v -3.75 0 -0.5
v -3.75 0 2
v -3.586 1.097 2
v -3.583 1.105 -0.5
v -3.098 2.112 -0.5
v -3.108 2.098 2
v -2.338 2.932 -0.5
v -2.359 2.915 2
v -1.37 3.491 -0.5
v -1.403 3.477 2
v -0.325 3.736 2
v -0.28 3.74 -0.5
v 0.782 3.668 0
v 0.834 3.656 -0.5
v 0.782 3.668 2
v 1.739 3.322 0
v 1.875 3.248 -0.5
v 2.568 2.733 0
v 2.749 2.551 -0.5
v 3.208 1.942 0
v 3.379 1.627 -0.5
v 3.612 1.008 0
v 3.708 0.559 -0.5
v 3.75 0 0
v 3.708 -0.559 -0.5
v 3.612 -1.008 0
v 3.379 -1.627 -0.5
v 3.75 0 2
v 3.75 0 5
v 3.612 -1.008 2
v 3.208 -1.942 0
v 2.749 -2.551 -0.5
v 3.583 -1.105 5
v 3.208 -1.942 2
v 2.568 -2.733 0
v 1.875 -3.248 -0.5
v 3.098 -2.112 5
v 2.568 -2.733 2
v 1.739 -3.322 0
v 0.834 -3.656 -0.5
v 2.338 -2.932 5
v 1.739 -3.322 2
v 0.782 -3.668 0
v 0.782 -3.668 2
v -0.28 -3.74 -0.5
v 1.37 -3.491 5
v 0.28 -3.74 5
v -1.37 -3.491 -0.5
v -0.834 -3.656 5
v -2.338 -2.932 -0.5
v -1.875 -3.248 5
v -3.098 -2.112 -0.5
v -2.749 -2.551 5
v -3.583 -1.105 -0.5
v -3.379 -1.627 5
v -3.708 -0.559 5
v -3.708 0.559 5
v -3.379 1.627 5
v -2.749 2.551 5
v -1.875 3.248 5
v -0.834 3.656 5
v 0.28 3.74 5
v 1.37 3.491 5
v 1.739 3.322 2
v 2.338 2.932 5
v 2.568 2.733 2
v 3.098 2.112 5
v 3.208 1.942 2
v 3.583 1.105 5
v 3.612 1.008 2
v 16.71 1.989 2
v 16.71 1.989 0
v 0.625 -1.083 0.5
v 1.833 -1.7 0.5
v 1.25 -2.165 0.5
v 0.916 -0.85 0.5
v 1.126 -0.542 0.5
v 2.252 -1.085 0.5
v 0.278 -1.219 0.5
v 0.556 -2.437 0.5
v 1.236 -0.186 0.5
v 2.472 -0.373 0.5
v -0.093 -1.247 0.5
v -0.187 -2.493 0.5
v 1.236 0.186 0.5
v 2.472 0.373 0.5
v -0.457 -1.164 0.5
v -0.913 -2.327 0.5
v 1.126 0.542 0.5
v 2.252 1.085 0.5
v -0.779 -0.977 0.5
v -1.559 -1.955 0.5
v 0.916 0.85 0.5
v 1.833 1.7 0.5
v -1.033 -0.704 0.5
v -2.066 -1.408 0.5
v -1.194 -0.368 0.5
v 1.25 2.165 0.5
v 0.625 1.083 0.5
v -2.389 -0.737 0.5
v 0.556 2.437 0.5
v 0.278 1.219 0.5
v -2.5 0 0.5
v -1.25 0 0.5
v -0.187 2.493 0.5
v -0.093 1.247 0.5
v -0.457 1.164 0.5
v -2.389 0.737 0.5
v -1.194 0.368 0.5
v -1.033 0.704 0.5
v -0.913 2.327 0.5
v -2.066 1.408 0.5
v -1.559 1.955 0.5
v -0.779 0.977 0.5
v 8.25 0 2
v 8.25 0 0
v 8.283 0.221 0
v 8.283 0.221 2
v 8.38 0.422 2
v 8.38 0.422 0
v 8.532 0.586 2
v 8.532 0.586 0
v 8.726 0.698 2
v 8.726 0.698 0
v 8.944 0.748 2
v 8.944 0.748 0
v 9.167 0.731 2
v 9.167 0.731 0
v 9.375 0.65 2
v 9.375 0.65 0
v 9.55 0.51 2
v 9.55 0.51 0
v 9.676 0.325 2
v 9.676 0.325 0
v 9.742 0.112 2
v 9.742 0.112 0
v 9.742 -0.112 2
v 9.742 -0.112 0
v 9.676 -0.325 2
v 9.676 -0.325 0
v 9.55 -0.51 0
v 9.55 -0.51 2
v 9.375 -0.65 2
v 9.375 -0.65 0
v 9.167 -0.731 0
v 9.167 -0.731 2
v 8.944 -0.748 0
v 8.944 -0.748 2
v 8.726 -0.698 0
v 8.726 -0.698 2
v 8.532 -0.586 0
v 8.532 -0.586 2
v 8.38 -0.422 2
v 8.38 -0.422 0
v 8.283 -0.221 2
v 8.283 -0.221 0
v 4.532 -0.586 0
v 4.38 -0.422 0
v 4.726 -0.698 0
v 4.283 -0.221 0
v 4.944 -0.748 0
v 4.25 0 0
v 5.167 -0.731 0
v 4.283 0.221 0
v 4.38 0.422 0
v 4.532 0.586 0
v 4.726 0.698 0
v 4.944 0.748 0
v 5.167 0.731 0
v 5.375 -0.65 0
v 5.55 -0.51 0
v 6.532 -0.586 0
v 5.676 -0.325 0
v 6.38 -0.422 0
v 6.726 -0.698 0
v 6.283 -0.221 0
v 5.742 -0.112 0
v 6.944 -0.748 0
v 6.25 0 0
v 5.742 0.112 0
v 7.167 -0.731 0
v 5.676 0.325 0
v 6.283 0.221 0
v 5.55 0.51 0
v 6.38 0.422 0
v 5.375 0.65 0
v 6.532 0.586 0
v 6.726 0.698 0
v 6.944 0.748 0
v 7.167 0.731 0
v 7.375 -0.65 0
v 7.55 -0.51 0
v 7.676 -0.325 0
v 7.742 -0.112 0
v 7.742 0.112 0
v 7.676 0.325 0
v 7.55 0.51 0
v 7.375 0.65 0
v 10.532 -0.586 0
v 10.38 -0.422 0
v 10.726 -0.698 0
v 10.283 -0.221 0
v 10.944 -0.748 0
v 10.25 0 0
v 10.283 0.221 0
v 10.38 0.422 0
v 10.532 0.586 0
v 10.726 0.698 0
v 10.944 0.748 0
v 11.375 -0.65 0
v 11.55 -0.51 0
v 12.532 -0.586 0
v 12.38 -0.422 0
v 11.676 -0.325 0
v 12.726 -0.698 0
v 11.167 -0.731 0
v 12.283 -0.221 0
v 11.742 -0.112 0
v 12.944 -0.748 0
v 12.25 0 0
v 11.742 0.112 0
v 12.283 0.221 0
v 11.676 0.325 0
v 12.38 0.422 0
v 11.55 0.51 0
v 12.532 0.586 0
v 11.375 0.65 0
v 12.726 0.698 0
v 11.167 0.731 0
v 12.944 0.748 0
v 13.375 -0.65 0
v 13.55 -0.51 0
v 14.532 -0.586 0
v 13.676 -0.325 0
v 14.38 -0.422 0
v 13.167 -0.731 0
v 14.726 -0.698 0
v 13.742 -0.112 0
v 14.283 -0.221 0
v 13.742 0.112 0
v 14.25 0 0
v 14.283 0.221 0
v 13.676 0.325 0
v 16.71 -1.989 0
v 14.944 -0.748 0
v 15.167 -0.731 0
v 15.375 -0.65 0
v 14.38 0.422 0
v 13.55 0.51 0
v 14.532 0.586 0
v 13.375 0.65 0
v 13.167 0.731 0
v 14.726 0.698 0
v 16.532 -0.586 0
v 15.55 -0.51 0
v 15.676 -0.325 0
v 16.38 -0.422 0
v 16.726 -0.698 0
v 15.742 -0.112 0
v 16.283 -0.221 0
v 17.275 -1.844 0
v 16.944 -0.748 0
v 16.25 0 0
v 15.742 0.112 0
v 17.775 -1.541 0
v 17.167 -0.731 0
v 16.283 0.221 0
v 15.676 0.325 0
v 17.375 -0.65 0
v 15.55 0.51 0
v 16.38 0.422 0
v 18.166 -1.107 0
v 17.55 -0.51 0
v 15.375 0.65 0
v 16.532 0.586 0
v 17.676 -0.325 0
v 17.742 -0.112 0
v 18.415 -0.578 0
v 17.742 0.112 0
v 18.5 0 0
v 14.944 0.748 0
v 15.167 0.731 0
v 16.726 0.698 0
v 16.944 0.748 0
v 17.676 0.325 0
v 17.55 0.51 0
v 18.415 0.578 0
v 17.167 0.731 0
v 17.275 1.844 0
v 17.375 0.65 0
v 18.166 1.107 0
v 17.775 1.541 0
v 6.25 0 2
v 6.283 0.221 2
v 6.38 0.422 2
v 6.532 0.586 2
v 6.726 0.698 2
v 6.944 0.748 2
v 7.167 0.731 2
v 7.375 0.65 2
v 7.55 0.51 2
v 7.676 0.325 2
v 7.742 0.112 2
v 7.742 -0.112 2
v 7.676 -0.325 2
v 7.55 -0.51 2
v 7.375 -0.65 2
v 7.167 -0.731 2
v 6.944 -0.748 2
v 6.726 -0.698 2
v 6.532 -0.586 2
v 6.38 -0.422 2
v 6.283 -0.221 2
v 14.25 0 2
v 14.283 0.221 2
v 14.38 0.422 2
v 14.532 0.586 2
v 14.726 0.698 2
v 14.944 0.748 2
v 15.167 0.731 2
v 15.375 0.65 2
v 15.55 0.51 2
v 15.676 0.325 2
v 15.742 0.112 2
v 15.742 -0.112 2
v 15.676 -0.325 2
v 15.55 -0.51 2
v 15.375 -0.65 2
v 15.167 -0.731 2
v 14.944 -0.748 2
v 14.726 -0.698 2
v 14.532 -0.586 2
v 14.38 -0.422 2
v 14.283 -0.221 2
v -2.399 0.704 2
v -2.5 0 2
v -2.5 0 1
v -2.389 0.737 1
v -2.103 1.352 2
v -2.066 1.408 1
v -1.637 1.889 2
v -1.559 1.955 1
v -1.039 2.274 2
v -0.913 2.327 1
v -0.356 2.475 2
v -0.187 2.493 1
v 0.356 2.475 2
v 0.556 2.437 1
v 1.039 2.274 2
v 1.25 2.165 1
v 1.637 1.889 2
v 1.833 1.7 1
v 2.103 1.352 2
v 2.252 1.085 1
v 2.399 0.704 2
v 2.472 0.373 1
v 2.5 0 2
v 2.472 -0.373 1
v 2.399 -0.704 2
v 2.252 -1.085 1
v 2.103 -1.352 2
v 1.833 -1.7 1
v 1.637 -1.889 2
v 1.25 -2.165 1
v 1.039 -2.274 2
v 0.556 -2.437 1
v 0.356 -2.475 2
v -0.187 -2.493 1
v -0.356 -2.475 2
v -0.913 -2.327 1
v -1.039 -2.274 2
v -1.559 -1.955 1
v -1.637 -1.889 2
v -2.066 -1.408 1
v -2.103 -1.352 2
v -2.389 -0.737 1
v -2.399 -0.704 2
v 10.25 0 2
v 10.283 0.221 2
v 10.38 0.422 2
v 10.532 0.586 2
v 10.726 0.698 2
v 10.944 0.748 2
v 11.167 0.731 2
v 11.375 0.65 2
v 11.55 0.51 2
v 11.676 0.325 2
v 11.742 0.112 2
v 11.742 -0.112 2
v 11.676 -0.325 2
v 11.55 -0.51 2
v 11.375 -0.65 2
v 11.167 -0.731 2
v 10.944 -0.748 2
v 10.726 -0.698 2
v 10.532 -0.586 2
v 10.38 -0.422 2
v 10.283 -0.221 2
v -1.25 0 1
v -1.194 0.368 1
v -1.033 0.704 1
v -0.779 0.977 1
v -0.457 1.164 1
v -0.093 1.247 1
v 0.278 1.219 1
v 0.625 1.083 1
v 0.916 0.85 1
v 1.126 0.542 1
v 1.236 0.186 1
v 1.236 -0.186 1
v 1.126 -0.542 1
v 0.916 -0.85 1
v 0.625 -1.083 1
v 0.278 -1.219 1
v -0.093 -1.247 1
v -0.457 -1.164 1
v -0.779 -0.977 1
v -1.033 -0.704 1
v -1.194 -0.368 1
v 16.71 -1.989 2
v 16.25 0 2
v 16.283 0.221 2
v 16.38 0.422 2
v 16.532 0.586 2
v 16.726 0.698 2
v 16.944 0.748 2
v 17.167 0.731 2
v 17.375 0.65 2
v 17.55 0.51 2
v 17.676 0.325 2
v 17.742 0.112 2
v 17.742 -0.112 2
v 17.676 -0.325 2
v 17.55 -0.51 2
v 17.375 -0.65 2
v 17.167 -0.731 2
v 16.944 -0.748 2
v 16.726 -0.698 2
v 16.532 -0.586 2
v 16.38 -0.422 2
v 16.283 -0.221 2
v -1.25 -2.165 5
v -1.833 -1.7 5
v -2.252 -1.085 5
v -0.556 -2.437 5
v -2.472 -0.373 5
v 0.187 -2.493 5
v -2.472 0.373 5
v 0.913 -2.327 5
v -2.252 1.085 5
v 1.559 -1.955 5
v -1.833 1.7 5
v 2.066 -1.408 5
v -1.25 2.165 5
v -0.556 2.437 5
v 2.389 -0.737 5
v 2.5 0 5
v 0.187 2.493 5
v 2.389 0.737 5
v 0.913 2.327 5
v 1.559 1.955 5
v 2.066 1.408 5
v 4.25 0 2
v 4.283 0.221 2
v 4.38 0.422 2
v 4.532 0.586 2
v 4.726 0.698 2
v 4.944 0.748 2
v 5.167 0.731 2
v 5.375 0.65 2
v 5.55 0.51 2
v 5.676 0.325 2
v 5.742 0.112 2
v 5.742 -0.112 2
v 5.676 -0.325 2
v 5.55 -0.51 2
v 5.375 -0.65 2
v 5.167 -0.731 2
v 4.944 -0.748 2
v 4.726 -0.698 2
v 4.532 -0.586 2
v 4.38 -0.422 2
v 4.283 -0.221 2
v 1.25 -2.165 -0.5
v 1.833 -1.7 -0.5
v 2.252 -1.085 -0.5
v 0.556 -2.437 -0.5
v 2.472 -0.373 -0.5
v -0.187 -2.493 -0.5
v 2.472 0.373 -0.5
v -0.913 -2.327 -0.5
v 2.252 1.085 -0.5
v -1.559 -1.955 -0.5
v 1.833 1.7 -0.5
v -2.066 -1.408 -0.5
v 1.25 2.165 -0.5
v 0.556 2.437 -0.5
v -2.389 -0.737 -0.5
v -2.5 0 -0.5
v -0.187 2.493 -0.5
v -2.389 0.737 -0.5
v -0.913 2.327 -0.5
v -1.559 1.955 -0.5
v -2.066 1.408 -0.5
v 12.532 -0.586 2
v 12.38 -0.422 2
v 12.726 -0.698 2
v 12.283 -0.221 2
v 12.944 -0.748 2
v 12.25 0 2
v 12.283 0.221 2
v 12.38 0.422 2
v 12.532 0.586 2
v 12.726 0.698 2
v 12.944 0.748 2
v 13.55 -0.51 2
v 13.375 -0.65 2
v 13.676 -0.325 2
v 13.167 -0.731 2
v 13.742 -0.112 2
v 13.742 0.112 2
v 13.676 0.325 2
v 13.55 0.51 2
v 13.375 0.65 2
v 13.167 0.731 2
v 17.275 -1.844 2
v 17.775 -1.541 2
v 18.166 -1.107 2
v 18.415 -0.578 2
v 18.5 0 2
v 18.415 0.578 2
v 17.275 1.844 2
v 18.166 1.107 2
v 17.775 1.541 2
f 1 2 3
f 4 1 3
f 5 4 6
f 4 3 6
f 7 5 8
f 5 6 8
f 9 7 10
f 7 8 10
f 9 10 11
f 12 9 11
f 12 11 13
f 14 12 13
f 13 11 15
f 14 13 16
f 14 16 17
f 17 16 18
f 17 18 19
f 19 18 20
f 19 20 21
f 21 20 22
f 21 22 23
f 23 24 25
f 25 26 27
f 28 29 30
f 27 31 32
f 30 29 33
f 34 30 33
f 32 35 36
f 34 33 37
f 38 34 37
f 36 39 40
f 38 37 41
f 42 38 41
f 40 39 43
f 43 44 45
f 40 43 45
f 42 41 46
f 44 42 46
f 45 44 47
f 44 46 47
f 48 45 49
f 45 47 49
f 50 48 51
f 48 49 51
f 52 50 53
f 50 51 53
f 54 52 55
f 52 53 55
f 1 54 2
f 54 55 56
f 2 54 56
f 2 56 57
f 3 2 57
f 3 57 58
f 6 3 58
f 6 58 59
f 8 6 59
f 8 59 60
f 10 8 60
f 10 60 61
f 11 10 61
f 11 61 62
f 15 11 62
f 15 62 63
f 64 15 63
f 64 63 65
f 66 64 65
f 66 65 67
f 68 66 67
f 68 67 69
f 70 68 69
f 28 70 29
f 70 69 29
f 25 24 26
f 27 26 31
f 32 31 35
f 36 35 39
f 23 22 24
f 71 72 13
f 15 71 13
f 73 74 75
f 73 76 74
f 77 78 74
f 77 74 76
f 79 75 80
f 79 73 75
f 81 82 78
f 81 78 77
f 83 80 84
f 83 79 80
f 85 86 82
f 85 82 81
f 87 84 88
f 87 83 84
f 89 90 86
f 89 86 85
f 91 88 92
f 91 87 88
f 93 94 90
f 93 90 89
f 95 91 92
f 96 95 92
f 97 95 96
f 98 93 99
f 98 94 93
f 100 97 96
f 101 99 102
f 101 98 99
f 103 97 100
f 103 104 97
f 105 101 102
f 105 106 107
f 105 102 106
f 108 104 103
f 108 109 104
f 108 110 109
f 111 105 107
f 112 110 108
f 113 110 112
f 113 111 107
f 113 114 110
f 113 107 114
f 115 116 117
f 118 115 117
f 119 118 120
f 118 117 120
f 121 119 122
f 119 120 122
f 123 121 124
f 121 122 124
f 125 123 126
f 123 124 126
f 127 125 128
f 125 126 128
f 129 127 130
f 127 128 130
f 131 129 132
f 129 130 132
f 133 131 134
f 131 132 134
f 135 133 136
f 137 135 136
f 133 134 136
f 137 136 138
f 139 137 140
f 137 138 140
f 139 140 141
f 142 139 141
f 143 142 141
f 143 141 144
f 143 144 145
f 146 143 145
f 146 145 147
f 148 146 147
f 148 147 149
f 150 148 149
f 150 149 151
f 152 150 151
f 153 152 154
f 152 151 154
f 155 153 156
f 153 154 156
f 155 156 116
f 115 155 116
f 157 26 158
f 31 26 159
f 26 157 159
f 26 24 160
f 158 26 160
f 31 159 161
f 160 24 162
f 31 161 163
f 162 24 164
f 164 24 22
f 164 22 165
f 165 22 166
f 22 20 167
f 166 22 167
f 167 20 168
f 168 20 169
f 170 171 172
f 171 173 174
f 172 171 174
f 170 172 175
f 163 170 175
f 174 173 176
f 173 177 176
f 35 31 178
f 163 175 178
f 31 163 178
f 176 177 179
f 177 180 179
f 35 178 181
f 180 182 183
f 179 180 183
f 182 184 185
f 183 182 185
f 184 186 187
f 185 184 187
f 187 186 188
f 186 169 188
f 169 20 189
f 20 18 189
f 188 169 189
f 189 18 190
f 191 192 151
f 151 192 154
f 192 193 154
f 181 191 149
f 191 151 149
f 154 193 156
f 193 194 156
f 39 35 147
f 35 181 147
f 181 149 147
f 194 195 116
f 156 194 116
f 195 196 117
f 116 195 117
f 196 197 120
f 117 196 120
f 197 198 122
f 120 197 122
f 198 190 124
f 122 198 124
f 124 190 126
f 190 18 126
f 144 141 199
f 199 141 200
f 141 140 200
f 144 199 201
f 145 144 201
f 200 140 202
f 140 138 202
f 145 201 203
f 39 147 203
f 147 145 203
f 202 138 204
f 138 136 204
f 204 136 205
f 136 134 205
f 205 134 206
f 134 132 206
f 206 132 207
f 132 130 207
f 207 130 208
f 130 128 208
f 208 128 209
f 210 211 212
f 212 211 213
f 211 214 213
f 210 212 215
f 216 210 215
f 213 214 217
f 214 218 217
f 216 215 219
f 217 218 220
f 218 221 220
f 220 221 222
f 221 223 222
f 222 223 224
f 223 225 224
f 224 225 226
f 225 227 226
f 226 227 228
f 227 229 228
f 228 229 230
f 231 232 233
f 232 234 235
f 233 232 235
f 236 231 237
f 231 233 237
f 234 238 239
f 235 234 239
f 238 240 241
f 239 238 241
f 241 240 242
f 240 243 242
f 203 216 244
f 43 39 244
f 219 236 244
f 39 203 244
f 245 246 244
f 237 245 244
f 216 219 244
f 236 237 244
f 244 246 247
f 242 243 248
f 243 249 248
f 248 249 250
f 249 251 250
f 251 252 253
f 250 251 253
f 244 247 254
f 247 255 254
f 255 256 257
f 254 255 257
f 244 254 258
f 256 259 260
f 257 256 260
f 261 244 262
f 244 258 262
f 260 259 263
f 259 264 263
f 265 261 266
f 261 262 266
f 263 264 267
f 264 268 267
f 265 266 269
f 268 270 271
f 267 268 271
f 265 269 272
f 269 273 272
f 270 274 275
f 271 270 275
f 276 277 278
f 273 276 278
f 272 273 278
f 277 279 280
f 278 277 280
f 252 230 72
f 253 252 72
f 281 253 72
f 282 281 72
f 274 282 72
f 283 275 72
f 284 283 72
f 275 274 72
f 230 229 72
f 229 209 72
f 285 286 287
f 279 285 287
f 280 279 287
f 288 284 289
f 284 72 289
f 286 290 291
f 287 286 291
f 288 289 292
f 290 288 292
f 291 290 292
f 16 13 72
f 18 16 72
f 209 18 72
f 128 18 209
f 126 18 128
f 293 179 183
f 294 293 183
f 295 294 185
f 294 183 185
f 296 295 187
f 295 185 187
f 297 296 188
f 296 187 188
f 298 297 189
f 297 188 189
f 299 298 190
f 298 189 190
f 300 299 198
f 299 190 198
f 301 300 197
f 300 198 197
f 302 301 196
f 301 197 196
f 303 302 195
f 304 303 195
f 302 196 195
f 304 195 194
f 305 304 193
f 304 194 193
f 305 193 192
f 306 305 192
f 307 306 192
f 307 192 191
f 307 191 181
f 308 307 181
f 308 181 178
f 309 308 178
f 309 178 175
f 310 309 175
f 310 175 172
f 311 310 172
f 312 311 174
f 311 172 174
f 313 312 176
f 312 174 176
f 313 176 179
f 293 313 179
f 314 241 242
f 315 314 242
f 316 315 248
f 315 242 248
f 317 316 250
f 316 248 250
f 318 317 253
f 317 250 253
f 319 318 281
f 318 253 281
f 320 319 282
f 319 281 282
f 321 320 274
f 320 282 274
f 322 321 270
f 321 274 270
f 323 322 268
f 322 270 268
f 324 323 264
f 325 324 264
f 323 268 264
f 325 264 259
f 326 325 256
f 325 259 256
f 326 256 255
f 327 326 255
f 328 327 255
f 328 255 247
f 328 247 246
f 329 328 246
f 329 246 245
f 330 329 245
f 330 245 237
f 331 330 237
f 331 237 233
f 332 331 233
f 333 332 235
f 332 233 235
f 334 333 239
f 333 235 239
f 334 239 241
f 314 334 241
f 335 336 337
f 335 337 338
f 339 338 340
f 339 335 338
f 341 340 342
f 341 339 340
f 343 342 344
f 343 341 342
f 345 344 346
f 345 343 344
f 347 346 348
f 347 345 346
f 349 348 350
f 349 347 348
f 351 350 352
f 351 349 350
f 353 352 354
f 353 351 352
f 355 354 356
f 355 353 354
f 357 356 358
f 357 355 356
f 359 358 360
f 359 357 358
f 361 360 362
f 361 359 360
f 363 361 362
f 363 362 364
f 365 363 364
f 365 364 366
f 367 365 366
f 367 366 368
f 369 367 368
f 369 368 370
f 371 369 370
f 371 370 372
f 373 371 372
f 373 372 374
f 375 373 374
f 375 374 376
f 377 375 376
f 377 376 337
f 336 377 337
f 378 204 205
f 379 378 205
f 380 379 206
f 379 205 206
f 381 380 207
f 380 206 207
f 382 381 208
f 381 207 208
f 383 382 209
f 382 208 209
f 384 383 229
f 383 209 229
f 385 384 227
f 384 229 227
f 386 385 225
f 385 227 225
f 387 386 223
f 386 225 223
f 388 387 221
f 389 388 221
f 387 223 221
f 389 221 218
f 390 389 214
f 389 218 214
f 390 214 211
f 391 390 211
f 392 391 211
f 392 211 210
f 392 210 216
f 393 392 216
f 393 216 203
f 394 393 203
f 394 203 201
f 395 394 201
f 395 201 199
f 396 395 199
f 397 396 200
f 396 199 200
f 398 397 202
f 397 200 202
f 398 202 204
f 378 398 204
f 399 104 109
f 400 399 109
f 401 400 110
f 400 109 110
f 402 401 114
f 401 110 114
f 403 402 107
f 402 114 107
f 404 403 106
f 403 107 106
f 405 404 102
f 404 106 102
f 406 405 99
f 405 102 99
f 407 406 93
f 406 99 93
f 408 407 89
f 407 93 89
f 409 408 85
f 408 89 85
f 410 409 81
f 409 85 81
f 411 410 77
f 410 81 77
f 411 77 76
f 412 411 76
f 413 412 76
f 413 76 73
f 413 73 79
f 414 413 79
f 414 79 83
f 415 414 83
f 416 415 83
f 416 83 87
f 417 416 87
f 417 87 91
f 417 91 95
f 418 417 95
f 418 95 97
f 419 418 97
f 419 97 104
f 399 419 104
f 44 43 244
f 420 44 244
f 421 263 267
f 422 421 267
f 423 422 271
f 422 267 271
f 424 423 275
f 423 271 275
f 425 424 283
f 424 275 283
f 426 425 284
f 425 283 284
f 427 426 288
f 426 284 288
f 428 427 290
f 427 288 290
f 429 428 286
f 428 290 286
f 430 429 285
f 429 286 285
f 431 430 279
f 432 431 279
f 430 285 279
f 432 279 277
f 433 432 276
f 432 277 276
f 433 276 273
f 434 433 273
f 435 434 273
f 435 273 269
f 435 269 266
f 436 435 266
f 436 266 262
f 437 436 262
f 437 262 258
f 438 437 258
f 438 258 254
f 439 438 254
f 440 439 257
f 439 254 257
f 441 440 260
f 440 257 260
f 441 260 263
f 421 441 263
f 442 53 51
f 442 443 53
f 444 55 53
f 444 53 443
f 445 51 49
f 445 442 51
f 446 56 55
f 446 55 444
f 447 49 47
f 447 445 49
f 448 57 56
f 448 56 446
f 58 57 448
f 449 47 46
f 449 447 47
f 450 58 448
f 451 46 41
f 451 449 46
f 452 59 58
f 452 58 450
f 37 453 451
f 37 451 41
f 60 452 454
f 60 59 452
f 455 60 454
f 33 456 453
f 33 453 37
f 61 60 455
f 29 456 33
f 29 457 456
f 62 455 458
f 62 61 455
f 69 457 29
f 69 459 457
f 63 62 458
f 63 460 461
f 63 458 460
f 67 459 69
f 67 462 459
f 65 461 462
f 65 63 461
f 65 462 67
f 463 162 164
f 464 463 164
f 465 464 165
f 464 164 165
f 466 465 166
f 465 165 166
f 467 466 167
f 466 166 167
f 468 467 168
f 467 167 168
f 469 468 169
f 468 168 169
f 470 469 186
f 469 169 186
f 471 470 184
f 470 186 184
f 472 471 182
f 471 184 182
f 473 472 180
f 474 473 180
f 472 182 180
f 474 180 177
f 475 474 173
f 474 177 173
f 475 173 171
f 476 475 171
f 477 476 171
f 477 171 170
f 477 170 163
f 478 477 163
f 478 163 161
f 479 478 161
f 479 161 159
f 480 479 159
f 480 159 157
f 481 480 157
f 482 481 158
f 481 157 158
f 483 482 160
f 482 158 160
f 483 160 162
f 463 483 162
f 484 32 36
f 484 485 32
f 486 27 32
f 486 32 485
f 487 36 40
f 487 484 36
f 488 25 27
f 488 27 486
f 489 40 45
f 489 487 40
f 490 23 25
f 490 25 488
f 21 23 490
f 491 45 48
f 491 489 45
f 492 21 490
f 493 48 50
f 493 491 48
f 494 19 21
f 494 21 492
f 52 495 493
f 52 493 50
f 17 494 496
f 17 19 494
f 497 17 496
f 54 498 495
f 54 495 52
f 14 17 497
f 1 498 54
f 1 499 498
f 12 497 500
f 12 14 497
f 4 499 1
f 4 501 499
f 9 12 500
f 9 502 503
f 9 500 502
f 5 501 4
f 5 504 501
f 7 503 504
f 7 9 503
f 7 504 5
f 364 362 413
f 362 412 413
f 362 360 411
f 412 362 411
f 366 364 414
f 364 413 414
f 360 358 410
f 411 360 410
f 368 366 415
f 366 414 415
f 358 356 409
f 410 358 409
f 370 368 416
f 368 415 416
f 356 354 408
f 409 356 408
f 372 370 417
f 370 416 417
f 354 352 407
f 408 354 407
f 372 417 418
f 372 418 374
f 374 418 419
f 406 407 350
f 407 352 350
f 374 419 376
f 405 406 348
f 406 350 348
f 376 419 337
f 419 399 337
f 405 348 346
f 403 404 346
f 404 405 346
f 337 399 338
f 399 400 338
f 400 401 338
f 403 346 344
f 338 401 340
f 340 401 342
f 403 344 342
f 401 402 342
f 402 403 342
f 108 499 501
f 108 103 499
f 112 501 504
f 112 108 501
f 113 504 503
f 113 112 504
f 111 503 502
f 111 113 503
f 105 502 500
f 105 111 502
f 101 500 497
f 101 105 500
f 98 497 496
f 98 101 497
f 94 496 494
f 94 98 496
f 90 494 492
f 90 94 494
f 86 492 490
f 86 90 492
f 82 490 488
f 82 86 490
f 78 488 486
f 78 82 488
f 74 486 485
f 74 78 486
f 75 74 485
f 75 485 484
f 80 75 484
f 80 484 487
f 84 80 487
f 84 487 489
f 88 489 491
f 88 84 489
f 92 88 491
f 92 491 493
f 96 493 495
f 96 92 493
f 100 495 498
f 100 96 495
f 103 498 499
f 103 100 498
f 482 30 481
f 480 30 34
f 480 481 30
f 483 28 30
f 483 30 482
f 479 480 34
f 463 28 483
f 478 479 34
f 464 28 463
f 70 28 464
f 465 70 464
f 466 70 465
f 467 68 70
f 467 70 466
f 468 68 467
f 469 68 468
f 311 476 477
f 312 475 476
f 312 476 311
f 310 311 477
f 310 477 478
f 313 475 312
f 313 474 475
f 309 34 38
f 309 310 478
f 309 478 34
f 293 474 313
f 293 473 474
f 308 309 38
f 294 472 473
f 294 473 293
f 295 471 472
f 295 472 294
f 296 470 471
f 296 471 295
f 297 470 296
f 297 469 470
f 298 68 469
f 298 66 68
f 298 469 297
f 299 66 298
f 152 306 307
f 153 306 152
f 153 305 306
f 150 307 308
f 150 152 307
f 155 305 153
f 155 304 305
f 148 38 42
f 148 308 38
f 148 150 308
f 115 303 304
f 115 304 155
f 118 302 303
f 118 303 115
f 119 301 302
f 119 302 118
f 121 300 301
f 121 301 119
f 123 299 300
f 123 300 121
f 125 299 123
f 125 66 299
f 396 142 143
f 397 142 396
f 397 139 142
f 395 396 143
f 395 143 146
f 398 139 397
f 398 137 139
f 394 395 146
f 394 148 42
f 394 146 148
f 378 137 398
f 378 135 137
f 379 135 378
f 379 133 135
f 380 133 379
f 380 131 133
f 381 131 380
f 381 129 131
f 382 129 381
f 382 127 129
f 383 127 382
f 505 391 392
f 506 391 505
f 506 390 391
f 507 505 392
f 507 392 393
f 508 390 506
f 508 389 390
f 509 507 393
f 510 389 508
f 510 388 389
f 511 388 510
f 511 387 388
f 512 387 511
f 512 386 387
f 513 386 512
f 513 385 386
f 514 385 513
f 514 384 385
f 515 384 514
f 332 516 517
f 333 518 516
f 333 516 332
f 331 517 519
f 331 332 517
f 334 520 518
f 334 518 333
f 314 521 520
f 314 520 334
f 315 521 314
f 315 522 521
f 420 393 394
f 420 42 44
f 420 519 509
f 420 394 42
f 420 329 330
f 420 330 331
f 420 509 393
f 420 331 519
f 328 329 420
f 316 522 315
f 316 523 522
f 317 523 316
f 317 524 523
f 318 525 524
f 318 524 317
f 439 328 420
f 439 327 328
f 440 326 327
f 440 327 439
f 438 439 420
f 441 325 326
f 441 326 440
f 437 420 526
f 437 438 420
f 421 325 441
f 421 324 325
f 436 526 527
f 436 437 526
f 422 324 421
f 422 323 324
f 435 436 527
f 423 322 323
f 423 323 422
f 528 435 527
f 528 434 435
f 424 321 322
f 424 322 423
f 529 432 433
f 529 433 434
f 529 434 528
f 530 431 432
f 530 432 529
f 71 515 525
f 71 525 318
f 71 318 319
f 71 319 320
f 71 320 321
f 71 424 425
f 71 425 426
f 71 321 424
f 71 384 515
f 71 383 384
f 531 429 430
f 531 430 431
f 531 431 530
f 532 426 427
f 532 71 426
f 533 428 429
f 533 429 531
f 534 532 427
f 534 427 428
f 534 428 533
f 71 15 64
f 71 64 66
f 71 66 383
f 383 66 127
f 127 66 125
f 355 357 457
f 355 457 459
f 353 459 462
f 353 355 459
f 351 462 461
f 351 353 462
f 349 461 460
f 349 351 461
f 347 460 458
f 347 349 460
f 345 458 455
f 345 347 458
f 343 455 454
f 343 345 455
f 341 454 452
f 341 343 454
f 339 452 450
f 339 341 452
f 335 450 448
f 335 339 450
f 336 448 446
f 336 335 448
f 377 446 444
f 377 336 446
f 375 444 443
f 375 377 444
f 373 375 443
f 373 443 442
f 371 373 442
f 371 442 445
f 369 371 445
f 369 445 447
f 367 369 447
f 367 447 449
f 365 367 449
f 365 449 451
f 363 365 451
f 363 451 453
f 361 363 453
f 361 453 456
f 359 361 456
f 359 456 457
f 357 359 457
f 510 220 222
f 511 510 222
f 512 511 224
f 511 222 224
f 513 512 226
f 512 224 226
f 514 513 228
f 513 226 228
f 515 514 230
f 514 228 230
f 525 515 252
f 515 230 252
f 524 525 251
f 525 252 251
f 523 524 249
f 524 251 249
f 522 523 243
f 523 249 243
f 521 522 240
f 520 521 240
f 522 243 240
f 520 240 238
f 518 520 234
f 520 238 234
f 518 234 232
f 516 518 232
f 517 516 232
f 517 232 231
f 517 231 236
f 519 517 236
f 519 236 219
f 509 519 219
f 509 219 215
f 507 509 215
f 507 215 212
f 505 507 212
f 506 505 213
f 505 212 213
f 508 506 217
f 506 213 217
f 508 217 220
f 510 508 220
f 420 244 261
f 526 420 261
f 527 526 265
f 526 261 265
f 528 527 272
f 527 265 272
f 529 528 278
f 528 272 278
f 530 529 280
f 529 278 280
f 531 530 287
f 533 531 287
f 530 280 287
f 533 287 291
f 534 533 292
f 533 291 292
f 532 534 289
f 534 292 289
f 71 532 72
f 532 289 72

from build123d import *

# Parameters (mm, degrees)
EXTRUDE_3_DEPTH     = 2
SKETCH_2_R          = 3.75
SKETCH_2_R_2        = 2.5
EXTRUDE_5_DEPTH     = 3
SKETCH_3_R          = 3.75
SKETCH_3_R_2        = 2.5
EXTRUDE_6_DEPTH     = 2.5
SKETCH_4_R          = 0.75
CUT_EXTRUDE_1_DEPTH = 2
SKETCH_5_R          = 2.5
EXTRUDE_7_DEPTH     = 1
SKETCH_6_R          = 2.5
CUT_EXTRUDE_2_DEPTH = 0.5
SKETCH_7_R          = 1.25
CUT_EXTRUDE_3_DEPTH = 5


with BuildPart() as part:
    # Эскиз1 → Бобышка-Вытянуть3 (new body)
    with BuildSketch(Plane.XY):
        with BuildLine():
            Line((16.70961775, 1.988984766), (0.781737208, 3.667613248))
            ThreePointArc((0.781737208, 3.667613248), (2.914962652, 2.359129656), (3.75, 0))
            ThreePointArc((3.75, 0), (2.914962652, -2.359129656), (0.781737208, -3.667613248))
            Line((0.781737208, -3.667613248), (16.70961775, -1.988984766))
            ThreePointArc((16.70961775, -1.988984766), (18.5, 0), (16.70961775, 1.988984766))
        make_face()
    extrude(amount=EXTRUDE_3_DEPTH)



with BuildPart() as body_2:
    # Эскиз2 → Бобышка-Вытянуть5 (new body)
    with BuildSketch(Plane.XY.offset(2)):
        Circle(SKETCH_2_R)
        Circle(SKETCH_2_R_2, mode=Mode.SUBTRACT)
    extrude(amount=EXTRUDE_5_DEPTH)


with BuildPart() as part_1:
    add(part.part)

    add(body_2.part)  # Бобышка-Вытянуть6 merges body 2
    # Эскиз3 → Бобышка-Вытянуть6 (add)
    with BuildSketch(Plane(origin=(0, 0, 2), x_dir=(-1, 0, 0), z_dir=(0, 0, -1))):
        Circle(SKETCH_3_R)
        Circle(SKETCH_3_R_2, mode=Mode.SUBTRACT)
    extrude(amount=EXTRUDE_6_DEPTH)

    # Эскиз4 → Вырез-Вытянуть1 (cut)
    with BuildSketch(Plane(origin=(0, 0, 0), x_dir=(-1, 0, 0), z_dir=(0, 0, -1))):
        with Locations((-17, 0)):
            Circle(SKETCH_4_R)
        with Locations((-7, 0)):
            Circle(SKETCH_4_R)
        with Locations((-9, 0)):
            Circle(SKETCH_4_R)
        with Locations((-11, 0)):
            Circle(SKETCH_4_R)
        with Locations((-13, 0)):
            Circle(SKETCH_4_R)
        with Locations((-15, 0)):
            Circle(SKETCH_4_R)
        with Locations((-5, 0)):
            Circle(SKETCH_4_R)
    extrude(amount=-CUT_EXTRUDE_1_DEPTH, mode=Mode.SUBTRACT)

    # Эскиз5 → Бобышка-Вытянуть7 (add)
    with BuildSketch(Plane(origin=(0, 0, 0), x_dir=(-1, 0, 0), z_dir=(0, 0, -1))):
        Circle(SKETCH_5_R)
    extrude(amount=-EXTRUDE_7_DEPTH)

    # Эскиз6 → Вырез-Вытянуть2 (cut)
    with BuildSketch(Plane(origin=(0, 0, 0), x_dir=(-1, 0, 0), z_dir=(0, 0, -1))):
        Circle(SKETCH_6_R)
    extrude(amount=-CUT_EXTRUDE_2_DEPTH, mode=Mode.SUBTRACT)

    # Эскиз7 → Вырез-Вытянуть3 (cut)
    with BuildSketch(Plane(origin=(0, 0, 0.5), x_dir=(-1, 0, 0), z_dir=(0, 0, -1))):
        Circle(SKETCH_7_R)
    extrude(amount=-CUT_EXTRUDE_3_DEPTH, mode=Mode.SUBTRACT)


solid = part_1.part
